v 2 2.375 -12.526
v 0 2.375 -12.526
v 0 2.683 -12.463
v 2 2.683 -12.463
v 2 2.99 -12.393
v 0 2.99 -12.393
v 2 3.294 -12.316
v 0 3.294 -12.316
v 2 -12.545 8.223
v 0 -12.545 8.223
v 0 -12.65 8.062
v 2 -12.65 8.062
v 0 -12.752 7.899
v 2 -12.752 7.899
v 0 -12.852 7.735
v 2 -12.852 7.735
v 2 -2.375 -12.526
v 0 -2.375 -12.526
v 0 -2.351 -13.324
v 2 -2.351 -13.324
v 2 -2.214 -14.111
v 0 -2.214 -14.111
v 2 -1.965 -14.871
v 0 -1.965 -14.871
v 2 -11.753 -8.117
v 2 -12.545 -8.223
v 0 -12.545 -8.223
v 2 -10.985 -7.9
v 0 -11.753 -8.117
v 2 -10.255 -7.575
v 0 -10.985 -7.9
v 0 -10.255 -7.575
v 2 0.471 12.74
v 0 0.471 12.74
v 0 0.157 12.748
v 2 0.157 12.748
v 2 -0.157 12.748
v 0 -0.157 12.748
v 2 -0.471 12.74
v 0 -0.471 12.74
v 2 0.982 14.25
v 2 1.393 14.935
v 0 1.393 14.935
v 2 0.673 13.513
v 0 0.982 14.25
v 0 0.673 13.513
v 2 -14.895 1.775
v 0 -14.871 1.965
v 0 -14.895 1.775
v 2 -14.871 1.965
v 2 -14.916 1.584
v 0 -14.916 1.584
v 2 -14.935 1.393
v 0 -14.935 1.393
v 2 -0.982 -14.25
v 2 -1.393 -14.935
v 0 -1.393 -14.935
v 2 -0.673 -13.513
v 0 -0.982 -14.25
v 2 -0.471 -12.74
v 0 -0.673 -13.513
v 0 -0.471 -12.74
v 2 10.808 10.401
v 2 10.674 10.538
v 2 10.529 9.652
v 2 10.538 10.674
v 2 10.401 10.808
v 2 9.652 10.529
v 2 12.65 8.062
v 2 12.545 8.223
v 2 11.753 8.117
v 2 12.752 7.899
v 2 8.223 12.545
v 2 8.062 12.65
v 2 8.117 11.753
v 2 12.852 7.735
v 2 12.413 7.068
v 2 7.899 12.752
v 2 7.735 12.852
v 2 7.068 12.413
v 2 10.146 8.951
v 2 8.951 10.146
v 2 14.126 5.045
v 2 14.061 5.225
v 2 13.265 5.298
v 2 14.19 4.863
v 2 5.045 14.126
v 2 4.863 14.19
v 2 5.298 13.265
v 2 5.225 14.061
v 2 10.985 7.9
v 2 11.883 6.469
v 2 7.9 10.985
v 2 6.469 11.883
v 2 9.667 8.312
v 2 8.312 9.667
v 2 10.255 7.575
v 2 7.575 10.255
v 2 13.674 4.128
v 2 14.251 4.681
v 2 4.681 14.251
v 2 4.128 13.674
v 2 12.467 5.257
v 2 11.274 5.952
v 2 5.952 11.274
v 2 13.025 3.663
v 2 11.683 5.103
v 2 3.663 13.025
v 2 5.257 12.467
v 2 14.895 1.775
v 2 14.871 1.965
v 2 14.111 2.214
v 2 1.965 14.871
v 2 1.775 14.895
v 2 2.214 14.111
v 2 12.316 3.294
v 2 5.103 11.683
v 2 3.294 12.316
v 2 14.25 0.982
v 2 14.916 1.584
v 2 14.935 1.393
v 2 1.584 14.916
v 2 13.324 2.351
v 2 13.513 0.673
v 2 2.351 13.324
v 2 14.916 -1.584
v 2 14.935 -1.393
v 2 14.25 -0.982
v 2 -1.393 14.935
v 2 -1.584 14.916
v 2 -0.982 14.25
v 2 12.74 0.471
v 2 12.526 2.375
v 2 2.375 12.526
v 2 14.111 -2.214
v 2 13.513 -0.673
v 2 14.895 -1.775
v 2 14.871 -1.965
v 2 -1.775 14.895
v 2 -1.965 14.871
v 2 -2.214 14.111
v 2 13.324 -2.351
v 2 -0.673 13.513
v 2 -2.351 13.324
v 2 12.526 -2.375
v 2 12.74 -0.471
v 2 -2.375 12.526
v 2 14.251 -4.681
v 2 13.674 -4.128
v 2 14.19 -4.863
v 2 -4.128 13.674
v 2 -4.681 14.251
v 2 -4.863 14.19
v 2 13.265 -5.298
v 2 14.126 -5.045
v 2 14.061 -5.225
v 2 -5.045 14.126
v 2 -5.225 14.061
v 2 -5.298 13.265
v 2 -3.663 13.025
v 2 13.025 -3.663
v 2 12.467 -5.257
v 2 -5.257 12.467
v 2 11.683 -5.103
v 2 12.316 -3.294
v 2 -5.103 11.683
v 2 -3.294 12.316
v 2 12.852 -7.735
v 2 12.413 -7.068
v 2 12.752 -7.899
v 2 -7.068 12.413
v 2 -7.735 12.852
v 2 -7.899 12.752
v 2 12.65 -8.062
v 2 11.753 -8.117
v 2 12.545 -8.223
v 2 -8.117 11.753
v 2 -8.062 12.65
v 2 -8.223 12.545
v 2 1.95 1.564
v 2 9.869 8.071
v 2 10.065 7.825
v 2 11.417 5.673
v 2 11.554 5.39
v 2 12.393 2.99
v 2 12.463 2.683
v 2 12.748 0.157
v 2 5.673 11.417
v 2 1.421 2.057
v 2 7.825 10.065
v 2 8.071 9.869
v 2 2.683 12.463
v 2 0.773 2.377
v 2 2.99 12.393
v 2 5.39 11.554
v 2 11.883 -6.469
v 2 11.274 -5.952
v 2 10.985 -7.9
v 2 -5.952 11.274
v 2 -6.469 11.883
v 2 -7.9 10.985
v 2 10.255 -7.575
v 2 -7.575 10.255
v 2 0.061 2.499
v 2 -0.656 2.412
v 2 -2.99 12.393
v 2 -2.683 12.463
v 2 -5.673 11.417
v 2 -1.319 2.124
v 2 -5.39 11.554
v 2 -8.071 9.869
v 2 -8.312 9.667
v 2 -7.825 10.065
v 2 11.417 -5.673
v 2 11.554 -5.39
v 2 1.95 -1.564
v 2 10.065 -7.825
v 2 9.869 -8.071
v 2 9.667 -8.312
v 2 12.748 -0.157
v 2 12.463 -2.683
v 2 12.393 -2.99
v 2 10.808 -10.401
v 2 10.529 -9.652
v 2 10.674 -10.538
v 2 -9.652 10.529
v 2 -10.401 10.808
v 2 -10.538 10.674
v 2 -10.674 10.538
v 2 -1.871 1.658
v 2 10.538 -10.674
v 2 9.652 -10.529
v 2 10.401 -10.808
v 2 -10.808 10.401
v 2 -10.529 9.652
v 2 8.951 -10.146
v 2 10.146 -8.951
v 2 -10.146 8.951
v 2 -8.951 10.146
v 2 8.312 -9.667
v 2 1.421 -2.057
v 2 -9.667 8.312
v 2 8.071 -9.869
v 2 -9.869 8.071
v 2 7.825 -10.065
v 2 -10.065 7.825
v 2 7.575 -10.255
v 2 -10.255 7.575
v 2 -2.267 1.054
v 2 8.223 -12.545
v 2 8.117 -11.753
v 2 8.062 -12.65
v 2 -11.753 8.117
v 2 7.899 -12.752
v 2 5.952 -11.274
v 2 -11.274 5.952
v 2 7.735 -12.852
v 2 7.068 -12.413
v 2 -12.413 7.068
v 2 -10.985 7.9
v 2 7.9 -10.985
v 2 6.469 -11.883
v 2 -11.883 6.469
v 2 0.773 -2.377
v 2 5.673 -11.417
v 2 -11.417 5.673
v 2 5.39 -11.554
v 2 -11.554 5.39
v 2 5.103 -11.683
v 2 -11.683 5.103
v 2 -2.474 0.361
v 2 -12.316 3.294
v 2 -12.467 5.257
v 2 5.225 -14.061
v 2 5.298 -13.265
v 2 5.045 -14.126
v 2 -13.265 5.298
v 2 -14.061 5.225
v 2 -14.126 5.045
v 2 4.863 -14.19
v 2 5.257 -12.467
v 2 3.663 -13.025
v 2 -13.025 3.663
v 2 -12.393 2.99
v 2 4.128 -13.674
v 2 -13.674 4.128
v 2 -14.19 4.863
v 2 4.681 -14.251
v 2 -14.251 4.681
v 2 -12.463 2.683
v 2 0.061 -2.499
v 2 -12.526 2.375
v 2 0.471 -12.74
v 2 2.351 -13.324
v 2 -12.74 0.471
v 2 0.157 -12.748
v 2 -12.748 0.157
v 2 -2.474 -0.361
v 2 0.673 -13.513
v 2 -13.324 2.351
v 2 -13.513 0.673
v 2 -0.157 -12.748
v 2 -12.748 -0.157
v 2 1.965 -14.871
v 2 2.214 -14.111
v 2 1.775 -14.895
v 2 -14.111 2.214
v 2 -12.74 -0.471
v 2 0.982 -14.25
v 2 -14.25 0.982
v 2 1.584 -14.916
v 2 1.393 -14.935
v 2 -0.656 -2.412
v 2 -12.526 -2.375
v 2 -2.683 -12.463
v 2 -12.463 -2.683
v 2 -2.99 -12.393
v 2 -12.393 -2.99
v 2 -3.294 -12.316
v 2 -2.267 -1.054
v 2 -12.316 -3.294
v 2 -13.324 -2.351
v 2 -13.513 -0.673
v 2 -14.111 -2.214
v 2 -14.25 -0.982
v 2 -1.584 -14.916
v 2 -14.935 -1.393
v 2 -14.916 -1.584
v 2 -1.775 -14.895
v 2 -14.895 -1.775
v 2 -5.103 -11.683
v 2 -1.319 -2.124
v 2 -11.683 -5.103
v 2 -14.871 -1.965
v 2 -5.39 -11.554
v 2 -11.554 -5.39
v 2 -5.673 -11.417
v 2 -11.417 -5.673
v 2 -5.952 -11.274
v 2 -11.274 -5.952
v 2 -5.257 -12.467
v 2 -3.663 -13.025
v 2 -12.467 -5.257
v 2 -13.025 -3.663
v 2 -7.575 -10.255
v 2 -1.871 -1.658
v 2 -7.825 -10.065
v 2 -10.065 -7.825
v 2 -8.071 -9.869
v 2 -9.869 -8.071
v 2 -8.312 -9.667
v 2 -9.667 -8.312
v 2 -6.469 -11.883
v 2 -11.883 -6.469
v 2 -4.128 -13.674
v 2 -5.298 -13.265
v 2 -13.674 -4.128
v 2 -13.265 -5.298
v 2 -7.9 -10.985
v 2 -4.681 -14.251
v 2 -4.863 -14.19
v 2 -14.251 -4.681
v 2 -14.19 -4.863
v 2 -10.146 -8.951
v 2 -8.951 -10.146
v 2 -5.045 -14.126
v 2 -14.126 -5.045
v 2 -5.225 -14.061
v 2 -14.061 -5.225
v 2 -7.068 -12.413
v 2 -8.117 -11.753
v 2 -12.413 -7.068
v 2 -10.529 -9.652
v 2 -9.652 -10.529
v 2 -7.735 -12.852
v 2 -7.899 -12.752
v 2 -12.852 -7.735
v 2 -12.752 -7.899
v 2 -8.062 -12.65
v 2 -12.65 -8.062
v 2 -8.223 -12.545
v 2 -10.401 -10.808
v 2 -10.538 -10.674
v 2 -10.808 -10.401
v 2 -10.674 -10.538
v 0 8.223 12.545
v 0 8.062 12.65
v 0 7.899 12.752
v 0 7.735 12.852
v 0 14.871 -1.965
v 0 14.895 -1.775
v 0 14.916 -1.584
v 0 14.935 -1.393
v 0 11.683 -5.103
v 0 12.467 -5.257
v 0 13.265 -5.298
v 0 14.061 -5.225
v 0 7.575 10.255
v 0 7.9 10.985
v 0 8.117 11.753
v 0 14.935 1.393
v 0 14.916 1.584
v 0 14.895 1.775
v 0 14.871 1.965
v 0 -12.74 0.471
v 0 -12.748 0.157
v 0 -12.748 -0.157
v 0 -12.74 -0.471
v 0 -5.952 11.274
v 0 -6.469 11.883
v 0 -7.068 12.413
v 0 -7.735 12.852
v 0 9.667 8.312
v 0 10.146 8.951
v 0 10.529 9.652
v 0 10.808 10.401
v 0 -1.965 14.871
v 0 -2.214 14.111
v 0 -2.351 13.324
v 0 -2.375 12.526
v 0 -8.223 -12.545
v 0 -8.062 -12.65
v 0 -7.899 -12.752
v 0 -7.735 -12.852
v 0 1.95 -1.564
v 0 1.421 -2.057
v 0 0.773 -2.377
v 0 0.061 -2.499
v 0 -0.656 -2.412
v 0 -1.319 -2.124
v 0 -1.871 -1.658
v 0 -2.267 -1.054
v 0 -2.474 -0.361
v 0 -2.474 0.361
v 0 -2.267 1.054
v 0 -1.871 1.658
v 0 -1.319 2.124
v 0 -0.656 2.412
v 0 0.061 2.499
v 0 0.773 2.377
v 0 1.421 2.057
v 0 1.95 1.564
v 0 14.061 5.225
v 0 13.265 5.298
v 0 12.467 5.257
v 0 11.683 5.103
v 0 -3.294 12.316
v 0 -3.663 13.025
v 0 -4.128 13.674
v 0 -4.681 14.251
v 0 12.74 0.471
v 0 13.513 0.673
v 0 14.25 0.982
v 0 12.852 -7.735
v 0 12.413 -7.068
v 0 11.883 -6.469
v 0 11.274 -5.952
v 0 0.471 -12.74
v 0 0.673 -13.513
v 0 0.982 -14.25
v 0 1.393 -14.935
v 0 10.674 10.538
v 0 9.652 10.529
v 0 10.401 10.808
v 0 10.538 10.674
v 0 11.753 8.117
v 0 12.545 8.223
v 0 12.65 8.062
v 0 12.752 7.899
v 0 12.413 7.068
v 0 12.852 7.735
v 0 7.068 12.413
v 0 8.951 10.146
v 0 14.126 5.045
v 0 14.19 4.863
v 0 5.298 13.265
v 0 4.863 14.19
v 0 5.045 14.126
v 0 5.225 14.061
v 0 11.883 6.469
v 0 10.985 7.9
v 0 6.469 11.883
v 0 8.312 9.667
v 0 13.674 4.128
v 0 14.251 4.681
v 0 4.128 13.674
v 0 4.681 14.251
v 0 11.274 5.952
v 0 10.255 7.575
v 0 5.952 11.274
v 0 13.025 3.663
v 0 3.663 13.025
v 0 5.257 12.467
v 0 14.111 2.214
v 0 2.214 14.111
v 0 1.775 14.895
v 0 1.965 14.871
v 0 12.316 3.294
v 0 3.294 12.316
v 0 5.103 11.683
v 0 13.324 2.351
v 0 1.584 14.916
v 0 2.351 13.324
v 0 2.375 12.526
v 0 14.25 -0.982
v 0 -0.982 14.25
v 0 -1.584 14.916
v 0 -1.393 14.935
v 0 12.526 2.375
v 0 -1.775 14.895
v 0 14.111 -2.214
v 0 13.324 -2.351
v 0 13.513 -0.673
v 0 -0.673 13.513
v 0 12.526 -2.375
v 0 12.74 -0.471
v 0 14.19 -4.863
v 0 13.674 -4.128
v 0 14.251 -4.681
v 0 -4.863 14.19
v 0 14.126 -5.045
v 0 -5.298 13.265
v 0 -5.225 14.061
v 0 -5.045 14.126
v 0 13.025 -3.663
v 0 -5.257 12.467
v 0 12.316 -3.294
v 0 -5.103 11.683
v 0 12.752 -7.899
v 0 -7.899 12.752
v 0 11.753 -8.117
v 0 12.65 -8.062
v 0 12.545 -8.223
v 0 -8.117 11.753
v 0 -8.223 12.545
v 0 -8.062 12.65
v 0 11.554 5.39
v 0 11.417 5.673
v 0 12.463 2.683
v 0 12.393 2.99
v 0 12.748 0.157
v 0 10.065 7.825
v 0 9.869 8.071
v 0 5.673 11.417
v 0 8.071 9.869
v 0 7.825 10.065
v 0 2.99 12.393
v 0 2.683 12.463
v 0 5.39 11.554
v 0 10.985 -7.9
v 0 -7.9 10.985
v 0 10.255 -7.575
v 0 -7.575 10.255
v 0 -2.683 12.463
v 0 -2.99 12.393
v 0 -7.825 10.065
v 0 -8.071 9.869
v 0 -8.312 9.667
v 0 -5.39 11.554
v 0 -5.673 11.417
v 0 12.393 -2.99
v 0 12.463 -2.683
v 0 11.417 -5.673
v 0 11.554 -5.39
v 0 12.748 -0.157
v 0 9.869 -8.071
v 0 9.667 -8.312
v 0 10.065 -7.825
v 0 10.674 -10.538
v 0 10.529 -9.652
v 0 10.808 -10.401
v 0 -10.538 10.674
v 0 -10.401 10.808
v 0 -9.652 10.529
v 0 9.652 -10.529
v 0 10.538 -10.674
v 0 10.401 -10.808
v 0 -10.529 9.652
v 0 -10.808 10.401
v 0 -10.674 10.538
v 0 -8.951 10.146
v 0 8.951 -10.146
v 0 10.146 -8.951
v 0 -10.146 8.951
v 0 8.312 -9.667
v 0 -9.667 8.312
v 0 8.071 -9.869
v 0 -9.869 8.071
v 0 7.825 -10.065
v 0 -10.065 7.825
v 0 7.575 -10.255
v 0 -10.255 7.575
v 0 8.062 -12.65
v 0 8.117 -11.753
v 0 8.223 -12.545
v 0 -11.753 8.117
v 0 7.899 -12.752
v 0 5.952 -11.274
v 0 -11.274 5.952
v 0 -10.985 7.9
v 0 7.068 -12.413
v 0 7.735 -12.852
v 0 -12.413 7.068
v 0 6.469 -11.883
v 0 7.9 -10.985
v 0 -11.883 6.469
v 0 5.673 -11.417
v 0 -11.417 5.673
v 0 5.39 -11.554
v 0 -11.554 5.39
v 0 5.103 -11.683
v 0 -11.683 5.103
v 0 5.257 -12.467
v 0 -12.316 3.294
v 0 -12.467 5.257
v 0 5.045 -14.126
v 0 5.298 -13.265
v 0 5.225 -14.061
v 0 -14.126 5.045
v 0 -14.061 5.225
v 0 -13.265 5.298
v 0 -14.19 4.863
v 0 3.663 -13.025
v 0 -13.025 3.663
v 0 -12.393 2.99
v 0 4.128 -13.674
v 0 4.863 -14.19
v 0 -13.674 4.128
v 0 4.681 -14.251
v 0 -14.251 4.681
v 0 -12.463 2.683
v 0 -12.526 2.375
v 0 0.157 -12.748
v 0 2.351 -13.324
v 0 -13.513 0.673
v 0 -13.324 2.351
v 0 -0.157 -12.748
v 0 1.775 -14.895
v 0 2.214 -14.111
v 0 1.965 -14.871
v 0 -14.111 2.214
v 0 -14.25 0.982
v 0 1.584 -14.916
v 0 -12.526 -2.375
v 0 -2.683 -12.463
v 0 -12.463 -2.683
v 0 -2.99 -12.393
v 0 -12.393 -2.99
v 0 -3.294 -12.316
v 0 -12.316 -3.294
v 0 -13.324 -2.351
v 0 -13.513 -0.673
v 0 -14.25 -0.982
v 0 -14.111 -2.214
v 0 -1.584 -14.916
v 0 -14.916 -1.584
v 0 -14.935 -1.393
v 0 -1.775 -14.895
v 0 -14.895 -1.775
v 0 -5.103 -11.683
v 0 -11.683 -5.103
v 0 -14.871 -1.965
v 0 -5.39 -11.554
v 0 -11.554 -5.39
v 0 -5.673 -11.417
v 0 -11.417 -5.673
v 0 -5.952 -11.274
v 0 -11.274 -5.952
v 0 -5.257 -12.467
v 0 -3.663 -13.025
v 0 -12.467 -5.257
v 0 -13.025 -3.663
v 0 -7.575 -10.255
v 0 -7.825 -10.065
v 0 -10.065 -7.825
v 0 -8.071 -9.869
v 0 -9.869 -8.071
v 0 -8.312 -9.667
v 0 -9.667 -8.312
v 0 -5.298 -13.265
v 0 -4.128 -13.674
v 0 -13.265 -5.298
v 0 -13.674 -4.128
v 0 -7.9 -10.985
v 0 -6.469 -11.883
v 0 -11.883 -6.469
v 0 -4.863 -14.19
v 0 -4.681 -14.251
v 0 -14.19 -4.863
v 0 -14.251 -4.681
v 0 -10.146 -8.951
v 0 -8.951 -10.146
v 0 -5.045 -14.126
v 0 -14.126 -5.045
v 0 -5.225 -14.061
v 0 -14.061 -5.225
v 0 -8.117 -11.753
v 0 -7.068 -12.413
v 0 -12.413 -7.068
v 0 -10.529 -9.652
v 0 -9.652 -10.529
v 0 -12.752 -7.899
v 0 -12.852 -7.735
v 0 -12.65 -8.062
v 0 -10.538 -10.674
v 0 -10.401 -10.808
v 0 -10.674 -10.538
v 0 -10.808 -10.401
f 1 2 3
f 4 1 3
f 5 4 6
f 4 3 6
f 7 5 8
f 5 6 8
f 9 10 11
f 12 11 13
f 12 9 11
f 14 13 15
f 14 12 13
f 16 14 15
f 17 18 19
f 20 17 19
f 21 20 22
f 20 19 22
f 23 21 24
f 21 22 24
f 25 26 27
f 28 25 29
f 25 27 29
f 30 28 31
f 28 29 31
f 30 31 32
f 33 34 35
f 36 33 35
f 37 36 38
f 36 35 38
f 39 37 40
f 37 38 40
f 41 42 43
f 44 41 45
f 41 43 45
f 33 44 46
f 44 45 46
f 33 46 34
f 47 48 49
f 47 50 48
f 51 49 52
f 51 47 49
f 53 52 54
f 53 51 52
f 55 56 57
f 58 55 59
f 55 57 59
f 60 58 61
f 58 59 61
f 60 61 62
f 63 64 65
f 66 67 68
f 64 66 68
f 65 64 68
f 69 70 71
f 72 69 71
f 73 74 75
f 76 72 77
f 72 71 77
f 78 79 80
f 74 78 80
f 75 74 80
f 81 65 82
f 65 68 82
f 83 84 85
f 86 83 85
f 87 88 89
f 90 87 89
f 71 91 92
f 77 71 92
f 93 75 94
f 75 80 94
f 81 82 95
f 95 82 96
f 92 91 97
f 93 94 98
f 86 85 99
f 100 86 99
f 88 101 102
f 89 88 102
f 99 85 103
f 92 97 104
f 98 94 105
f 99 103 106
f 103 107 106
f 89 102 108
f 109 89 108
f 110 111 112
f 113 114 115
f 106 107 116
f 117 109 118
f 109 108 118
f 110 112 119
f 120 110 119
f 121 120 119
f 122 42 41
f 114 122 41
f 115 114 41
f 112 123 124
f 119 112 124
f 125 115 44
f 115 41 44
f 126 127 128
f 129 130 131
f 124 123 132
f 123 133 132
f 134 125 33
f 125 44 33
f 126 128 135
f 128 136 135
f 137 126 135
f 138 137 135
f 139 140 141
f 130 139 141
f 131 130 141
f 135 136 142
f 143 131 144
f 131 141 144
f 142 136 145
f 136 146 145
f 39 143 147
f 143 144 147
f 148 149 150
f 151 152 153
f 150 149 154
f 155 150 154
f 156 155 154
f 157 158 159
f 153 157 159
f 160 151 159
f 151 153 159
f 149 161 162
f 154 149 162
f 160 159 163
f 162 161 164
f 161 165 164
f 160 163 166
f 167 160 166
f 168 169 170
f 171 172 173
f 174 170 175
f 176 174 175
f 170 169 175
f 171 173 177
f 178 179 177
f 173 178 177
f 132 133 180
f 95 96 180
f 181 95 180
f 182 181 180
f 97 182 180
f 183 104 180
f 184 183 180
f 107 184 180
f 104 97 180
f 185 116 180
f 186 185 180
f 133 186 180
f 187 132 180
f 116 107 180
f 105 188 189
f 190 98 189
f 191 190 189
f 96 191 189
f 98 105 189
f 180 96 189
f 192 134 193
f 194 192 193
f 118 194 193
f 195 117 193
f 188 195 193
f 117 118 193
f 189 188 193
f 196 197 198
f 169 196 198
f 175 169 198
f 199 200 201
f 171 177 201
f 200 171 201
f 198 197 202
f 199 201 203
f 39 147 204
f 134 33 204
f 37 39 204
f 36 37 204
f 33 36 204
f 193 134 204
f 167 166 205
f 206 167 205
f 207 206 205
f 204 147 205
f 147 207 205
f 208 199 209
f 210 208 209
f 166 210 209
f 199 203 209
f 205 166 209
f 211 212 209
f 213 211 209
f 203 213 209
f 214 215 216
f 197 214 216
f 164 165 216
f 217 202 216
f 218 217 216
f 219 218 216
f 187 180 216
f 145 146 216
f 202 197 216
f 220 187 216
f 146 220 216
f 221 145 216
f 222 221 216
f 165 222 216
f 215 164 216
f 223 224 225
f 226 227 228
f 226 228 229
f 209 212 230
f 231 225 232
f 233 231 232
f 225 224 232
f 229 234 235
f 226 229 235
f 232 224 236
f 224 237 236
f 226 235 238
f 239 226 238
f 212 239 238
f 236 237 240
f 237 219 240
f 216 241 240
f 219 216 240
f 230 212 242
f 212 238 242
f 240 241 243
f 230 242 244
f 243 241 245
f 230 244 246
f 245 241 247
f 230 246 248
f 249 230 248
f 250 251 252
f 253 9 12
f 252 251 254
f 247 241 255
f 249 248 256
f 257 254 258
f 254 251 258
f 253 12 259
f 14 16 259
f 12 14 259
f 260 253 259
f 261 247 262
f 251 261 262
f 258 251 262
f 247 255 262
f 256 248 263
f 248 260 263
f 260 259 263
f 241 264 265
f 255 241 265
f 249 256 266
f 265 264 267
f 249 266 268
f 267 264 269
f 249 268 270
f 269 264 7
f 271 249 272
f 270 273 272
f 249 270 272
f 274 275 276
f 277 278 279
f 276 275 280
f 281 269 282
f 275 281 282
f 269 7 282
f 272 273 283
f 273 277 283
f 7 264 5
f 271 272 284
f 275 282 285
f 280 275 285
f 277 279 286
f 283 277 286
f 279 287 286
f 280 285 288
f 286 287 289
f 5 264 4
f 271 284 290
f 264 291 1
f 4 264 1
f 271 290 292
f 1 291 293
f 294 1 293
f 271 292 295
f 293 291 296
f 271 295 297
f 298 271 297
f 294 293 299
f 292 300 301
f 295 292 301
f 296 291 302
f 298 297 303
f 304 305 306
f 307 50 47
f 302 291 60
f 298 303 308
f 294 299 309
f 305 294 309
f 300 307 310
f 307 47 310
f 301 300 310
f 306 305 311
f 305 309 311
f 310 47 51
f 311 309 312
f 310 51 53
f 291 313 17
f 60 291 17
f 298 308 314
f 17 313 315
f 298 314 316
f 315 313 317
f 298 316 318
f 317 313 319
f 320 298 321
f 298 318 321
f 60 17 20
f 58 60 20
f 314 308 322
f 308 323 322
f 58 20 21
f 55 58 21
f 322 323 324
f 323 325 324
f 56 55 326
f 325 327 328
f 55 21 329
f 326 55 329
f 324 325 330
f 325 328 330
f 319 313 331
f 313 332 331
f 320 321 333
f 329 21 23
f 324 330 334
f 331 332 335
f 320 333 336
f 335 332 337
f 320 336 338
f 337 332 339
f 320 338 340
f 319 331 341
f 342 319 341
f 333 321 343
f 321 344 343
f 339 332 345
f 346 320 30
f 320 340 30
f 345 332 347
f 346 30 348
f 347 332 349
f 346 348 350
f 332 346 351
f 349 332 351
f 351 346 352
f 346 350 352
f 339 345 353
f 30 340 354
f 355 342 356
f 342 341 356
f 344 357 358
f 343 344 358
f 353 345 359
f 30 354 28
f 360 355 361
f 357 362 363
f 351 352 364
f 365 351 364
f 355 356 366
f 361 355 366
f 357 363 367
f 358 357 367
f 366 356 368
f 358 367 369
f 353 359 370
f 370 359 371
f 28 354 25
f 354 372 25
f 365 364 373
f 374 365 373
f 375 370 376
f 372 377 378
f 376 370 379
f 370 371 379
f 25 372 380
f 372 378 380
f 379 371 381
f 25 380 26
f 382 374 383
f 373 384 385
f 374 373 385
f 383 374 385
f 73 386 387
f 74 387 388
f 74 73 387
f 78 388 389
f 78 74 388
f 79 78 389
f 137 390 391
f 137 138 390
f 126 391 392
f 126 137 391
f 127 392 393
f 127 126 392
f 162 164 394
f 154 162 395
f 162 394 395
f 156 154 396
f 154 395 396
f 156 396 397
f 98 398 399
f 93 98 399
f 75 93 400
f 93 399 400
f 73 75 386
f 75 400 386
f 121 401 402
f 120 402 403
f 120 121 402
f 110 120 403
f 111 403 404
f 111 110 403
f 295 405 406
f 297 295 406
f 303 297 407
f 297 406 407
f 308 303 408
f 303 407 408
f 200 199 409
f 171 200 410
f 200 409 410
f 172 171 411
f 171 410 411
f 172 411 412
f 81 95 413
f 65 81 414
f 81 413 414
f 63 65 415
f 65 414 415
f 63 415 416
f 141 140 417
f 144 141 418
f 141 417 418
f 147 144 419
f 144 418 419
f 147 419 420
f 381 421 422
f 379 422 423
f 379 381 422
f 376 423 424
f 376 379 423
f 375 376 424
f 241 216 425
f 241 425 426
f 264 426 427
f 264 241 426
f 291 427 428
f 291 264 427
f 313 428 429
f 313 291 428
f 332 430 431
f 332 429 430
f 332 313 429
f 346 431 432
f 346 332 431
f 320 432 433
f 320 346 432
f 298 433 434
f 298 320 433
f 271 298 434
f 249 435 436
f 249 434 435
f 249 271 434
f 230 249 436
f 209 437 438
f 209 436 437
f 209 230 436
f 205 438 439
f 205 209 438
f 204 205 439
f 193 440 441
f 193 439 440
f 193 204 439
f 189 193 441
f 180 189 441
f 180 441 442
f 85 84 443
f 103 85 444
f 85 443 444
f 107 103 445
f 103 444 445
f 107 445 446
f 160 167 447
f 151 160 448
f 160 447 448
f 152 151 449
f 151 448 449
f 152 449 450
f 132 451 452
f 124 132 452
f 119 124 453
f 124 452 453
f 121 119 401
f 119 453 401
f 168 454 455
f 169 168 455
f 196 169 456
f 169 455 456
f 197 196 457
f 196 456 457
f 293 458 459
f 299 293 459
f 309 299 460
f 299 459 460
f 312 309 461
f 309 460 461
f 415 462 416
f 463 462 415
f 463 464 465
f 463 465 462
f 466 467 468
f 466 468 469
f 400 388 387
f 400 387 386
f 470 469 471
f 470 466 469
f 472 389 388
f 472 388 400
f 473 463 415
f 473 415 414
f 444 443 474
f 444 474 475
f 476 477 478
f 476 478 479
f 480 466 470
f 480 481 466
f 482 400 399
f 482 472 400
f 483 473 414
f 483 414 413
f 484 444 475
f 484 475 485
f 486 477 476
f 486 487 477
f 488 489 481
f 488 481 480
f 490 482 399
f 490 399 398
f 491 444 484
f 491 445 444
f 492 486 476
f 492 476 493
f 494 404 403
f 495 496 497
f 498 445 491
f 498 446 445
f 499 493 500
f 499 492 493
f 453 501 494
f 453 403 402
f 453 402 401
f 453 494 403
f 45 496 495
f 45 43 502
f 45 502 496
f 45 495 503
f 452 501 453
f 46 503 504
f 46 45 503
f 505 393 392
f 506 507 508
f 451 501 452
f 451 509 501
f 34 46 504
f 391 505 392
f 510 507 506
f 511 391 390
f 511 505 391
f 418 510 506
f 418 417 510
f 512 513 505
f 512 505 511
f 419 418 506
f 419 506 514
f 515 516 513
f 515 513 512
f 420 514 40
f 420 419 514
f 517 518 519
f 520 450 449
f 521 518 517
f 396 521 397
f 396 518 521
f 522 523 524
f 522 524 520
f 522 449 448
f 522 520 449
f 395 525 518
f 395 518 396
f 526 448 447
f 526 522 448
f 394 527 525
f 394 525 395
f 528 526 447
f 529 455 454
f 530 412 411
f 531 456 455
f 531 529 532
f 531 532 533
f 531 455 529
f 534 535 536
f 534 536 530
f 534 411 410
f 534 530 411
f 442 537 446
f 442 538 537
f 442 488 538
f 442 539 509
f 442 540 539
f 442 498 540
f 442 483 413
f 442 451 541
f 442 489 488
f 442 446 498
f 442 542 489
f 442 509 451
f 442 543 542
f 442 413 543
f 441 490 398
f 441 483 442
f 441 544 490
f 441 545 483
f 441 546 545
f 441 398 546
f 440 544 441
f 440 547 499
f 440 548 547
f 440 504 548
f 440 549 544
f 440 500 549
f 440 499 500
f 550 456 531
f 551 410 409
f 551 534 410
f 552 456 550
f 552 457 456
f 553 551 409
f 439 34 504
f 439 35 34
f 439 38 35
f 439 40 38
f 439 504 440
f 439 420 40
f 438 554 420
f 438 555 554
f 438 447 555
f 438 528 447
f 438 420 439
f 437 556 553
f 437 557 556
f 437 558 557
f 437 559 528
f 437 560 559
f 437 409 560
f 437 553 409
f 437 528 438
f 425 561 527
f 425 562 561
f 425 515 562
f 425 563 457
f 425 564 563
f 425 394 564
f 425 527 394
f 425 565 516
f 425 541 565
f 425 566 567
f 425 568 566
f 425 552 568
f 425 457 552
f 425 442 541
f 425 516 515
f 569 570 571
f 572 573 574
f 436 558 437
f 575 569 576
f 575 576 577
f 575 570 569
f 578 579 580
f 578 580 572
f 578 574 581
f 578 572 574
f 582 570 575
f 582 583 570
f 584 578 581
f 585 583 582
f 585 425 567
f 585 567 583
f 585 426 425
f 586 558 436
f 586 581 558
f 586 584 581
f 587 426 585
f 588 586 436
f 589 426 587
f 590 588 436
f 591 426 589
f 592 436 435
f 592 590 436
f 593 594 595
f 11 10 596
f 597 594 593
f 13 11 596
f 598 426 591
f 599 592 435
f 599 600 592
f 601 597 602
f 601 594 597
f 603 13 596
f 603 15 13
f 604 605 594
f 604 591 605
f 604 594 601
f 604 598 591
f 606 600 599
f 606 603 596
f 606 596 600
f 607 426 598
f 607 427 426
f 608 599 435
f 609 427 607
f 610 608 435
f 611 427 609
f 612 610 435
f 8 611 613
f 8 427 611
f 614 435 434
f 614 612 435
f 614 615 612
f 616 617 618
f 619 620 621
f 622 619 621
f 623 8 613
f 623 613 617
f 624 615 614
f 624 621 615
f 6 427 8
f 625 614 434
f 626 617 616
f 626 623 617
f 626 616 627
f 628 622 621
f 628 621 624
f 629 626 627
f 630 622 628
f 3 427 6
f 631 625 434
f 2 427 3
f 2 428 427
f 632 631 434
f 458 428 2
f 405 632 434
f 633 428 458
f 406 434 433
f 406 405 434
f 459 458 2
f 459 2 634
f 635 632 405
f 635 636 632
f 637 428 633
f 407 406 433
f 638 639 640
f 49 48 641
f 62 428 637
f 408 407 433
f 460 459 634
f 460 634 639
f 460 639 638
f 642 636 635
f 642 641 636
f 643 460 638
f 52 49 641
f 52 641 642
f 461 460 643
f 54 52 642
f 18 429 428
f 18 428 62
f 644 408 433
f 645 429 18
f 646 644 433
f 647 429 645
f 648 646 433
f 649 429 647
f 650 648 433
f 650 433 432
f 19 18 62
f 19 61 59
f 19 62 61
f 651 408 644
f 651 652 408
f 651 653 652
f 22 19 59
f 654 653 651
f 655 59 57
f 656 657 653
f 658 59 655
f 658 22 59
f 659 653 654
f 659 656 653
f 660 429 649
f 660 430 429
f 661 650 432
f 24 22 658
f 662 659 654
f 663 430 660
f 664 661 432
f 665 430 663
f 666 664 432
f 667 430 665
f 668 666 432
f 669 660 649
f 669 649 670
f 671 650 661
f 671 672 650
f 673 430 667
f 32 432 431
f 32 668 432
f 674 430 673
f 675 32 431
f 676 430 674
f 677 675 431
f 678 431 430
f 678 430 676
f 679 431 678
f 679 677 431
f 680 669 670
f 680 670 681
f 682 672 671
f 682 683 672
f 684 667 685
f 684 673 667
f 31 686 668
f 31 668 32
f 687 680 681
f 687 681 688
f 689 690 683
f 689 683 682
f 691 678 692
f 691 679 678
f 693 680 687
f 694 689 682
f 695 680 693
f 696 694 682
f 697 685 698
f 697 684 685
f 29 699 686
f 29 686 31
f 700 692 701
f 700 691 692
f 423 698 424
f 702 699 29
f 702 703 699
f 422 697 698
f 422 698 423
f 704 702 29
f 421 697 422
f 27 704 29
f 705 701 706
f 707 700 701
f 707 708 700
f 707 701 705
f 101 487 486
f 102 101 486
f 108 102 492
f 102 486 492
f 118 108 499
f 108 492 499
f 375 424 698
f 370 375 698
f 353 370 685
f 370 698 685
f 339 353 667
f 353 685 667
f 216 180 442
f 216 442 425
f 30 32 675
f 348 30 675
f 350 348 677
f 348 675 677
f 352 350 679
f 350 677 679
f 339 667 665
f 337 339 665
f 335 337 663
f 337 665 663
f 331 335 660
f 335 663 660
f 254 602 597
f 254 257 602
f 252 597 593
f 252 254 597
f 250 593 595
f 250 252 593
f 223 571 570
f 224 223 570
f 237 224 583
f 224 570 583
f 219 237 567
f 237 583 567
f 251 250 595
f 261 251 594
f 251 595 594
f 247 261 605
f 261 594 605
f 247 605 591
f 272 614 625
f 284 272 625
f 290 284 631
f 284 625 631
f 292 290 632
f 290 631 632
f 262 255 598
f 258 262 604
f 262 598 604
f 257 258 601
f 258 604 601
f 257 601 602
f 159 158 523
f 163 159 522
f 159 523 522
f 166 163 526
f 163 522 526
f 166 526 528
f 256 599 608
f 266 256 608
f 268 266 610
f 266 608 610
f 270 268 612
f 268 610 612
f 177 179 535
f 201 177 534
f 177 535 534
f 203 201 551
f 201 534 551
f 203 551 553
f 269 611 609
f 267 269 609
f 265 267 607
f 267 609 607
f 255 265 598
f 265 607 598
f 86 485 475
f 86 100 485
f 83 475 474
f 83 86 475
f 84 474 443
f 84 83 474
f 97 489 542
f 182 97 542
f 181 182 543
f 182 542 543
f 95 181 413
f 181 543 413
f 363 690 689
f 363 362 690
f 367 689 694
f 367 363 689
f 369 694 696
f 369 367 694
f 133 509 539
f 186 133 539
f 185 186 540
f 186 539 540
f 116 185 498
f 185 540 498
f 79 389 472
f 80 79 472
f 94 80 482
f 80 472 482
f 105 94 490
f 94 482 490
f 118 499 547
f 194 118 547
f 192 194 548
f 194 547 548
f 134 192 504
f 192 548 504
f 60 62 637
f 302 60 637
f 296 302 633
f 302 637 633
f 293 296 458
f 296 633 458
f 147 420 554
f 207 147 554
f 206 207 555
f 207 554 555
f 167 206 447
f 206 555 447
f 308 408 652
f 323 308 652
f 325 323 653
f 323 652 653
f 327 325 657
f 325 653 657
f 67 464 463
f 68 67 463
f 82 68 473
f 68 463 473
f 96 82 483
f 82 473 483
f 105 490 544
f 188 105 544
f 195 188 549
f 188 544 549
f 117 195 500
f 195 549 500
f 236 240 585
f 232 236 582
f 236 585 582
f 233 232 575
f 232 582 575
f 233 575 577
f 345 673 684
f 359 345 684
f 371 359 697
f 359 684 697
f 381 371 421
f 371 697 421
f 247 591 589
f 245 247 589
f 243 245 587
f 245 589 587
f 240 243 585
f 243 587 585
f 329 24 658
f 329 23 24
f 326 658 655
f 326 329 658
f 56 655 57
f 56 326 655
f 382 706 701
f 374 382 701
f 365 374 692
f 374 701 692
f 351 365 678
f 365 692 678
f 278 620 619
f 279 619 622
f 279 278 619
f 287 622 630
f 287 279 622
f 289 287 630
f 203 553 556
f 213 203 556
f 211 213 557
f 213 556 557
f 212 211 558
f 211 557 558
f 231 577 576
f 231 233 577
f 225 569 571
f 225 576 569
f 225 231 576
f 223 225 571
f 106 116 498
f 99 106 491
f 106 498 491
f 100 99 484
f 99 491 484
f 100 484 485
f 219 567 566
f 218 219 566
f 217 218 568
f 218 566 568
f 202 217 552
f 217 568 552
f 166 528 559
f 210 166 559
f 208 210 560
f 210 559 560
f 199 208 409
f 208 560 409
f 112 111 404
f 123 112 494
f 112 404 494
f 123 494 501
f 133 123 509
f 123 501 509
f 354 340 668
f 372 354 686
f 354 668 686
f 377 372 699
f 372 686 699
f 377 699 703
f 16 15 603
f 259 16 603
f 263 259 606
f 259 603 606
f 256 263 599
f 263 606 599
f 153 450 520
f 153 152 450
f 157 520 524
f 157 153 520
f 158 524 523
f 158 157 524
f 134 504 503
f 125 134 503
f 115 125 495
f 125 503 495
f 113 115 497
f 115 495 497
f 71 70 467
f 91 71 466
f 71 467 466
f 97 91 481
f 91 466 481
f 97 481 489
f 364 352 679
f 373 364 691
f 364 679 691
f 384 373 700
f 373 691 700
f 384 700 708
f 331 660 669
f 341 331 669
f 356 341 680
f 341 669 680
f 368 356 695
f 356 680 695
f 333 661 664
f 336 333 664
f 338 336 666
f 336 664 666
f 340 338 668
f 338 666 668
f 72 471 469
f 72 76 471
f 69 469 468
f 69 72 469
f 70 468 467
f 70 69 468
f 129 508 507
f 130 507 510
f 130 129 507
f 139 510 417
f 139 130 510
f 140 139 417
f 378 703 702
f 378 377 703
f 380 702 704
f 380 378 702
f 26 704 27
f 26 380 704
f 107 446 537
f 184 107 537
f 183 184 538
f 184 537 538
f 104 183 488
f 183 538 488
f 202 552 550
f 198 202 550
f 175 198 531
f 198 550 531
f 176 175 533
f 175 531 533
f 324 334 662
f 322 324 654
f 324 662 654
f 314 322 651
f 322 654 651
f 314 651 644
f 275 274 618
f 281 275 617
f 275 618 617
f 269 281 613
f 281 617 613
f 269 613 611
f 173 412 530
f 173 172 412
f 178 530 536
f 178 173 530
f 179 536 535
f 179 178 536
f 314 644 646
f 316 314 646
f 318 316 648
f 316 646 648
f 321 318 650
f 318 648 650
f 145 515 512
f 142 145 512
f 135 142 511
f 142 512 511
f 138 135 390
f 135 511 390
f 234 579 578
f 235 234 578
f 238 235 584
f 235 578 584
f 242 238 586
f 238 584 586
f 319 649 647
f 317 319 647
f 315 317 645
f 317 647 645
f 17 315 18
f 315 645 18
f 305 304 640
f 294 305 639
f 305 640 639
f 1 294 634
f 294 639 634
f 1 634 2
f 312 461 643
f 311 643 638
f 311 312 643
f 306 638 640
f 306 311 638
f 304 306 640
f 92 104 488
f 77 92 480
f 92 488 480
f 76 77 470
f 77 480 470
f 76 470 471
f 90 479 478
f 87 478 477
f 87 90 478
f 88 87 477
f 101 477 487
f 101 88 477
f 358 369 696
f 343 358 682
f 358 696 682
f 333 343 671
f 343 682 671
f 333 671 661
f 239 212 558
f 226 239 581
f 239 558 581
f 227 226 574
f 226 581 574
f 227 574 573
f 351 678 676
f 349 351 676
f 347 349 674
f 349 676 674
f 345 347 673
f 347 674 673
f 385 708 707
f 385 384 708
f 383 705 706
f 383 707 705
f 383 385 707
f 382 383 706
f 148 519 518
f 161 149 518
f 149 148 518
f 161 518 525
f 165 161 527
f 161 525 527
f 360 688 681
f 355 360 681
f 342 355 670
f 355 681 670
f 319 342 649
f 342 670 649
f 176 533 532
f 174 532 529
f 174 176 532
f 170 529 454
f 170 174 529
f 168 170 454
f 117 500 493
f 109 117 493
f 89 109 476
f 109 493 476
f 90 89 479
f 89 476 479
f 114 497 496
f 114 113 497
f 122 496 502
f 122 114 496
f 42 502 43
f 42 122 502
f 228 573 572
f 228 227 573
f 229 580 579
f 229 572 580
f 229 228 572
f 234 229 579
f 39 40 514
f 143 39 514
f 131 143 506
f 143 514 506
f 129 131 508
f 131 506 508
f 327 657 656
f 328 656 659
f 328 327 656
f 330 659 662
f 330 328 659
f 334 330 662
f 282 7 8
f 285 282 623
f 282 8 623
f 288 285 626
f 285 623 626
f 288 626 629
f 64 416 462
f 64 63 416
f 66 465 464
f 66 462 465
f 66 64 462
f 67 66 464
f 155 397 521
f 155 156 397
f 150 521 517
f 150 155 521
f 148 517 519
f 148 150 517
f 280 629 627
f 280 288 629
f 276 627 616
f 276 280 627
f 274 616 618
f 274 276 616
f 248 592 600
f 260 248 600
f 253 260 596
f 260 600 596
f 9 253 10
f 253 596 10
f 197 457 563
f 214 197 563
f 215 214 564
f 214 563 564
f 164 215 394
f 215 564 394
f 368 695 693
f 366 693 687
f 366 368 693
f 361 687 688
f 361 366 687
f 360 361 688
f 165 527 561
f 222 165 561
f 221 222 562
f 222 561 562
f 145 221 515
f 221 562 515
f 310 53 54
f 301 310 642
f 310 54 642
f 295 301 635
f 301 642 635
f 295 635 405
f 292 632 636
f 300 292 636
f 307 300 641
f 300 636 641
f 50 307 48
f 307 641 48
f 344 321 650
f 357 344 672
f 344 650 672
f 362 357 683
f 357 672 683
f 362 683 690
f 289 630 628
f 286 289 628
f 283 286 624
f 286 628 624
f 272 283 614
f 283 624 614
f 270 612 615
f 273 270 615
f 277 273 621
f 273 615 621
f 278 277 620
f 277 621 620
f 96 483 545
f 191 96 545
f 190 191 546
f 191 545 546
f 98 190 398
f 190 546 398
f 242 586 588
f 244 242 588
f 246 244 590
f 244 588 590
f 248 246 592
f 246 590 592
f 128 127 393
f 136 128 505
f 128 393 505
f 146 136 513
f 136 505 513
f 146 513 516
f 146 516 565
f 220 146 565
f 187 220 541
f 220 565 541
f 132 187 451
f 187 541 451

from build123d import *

# Parameters (mm, degrees)
BASPROSKE_W        = 2
BASPROSKE_H        = 15
TOOTHCUT_DEPTH     = 22.307275753
TEETHCUTS_COUNT    = 28
TEETHCUTS_ANGLE    = 347.142857143
BORSKE_R           = 1.5
BORE_DEPTH         = 50.0000508
CUT_EXTRUDE1_DEPTH = 10


with BuildPart() as part:
    # BasProSke → Base-Revolve (revolve)
    with BuildSketch(Plane(origin=(0, 0, 0), x_dir=(1, 0, 0), z_dir=(0, 1, 0)), mode=Mode.PRIVATE) as base_revolve_sk:
        with Locations((1, 7.5)):
            Rectangle(BASPROSKE_W, BASPROSKE_H)
    revolve(base_revolve_sk.sketch.rotate(Axis((-10, 0, 0), (1, 0, 0)), 180), axis=Axis((-10, 0, 0), (1, 0, 0)))

    # TooCutSke → ToothCut (cut, through all)
    with BuildSketch(Plane(origin=(0, 0, 0), x_dir=(0, 0, -1), z_dir=(1, 0, 0))):
        with BuildLine():
            ThreePointArc((0.471336039, 12.740284272), (0, 12.749), (-0.471336039, 12.740284272))
            ThreePointArc((-0.471336039, 12.740284272), (-0.81983923, 13.900763331), (-1.409805137, 14.959114099))
            ThreePointArc((-1.409805137, 14.959114099), (0, 15.0254), (1.409805137, 14.959114099))
            ThreePointArc((1.409805137, 14.959114099), (0.81983923, 13.900763331), (0.471336039, 12.740284272))
        make_face()
    toothcut = extrude(amount=TOOTHCUT_DEPTH, mode=Mode.SUBTRACT)

    # TeethCuts: ToothCut ×28 about axis
    teethcuts_axis = Axis((-10, 0, 0), (1, 0, 0))
    for i in range(1, TEETHCUTS_COUNT):
        add(toothcut.rotate(teethcuts_axis, i * TEETHCUTS_ANGLE / (TEETHCUTS_COUNT - 1)), mode=Mode.SUBTRACT)

    # BorSke → Bore (cut, symmetric)
    with BuildSketch(Plane(origin=(0, 0, 0), x_dir=(0, 0, -1), z_dir=(1, 0, 0))):
        with Locations(Location((0, 0, 0), (0, 0, 180))):
            Circle(BORSKE_R)
    extrude(amount=BORE_DEPTH, both=True, mode=Mode.SUBTRACT)

    # Sketch1 → Cut-Extrude1 (cut)
    with BuildSketch(Plane(origin=(2, 0, 0), x_dir=(0, 0, -1), z_dir=(1, 0, 0))):
        with BuildLine():
            Line((0, 1.95), (1.564448785, 1.95))
            ThreePointArc((1.564448785, 1.95), (0, -2.5), (-1.564448785, 1.95))
            Line((-1.564448785, 1.95), (0, 1.95))
        make_face()
    extrude(amount=-CUT_EXTRUDE1_DEPTH, mode=Mode.SUBTRACT)


solid = part.part
